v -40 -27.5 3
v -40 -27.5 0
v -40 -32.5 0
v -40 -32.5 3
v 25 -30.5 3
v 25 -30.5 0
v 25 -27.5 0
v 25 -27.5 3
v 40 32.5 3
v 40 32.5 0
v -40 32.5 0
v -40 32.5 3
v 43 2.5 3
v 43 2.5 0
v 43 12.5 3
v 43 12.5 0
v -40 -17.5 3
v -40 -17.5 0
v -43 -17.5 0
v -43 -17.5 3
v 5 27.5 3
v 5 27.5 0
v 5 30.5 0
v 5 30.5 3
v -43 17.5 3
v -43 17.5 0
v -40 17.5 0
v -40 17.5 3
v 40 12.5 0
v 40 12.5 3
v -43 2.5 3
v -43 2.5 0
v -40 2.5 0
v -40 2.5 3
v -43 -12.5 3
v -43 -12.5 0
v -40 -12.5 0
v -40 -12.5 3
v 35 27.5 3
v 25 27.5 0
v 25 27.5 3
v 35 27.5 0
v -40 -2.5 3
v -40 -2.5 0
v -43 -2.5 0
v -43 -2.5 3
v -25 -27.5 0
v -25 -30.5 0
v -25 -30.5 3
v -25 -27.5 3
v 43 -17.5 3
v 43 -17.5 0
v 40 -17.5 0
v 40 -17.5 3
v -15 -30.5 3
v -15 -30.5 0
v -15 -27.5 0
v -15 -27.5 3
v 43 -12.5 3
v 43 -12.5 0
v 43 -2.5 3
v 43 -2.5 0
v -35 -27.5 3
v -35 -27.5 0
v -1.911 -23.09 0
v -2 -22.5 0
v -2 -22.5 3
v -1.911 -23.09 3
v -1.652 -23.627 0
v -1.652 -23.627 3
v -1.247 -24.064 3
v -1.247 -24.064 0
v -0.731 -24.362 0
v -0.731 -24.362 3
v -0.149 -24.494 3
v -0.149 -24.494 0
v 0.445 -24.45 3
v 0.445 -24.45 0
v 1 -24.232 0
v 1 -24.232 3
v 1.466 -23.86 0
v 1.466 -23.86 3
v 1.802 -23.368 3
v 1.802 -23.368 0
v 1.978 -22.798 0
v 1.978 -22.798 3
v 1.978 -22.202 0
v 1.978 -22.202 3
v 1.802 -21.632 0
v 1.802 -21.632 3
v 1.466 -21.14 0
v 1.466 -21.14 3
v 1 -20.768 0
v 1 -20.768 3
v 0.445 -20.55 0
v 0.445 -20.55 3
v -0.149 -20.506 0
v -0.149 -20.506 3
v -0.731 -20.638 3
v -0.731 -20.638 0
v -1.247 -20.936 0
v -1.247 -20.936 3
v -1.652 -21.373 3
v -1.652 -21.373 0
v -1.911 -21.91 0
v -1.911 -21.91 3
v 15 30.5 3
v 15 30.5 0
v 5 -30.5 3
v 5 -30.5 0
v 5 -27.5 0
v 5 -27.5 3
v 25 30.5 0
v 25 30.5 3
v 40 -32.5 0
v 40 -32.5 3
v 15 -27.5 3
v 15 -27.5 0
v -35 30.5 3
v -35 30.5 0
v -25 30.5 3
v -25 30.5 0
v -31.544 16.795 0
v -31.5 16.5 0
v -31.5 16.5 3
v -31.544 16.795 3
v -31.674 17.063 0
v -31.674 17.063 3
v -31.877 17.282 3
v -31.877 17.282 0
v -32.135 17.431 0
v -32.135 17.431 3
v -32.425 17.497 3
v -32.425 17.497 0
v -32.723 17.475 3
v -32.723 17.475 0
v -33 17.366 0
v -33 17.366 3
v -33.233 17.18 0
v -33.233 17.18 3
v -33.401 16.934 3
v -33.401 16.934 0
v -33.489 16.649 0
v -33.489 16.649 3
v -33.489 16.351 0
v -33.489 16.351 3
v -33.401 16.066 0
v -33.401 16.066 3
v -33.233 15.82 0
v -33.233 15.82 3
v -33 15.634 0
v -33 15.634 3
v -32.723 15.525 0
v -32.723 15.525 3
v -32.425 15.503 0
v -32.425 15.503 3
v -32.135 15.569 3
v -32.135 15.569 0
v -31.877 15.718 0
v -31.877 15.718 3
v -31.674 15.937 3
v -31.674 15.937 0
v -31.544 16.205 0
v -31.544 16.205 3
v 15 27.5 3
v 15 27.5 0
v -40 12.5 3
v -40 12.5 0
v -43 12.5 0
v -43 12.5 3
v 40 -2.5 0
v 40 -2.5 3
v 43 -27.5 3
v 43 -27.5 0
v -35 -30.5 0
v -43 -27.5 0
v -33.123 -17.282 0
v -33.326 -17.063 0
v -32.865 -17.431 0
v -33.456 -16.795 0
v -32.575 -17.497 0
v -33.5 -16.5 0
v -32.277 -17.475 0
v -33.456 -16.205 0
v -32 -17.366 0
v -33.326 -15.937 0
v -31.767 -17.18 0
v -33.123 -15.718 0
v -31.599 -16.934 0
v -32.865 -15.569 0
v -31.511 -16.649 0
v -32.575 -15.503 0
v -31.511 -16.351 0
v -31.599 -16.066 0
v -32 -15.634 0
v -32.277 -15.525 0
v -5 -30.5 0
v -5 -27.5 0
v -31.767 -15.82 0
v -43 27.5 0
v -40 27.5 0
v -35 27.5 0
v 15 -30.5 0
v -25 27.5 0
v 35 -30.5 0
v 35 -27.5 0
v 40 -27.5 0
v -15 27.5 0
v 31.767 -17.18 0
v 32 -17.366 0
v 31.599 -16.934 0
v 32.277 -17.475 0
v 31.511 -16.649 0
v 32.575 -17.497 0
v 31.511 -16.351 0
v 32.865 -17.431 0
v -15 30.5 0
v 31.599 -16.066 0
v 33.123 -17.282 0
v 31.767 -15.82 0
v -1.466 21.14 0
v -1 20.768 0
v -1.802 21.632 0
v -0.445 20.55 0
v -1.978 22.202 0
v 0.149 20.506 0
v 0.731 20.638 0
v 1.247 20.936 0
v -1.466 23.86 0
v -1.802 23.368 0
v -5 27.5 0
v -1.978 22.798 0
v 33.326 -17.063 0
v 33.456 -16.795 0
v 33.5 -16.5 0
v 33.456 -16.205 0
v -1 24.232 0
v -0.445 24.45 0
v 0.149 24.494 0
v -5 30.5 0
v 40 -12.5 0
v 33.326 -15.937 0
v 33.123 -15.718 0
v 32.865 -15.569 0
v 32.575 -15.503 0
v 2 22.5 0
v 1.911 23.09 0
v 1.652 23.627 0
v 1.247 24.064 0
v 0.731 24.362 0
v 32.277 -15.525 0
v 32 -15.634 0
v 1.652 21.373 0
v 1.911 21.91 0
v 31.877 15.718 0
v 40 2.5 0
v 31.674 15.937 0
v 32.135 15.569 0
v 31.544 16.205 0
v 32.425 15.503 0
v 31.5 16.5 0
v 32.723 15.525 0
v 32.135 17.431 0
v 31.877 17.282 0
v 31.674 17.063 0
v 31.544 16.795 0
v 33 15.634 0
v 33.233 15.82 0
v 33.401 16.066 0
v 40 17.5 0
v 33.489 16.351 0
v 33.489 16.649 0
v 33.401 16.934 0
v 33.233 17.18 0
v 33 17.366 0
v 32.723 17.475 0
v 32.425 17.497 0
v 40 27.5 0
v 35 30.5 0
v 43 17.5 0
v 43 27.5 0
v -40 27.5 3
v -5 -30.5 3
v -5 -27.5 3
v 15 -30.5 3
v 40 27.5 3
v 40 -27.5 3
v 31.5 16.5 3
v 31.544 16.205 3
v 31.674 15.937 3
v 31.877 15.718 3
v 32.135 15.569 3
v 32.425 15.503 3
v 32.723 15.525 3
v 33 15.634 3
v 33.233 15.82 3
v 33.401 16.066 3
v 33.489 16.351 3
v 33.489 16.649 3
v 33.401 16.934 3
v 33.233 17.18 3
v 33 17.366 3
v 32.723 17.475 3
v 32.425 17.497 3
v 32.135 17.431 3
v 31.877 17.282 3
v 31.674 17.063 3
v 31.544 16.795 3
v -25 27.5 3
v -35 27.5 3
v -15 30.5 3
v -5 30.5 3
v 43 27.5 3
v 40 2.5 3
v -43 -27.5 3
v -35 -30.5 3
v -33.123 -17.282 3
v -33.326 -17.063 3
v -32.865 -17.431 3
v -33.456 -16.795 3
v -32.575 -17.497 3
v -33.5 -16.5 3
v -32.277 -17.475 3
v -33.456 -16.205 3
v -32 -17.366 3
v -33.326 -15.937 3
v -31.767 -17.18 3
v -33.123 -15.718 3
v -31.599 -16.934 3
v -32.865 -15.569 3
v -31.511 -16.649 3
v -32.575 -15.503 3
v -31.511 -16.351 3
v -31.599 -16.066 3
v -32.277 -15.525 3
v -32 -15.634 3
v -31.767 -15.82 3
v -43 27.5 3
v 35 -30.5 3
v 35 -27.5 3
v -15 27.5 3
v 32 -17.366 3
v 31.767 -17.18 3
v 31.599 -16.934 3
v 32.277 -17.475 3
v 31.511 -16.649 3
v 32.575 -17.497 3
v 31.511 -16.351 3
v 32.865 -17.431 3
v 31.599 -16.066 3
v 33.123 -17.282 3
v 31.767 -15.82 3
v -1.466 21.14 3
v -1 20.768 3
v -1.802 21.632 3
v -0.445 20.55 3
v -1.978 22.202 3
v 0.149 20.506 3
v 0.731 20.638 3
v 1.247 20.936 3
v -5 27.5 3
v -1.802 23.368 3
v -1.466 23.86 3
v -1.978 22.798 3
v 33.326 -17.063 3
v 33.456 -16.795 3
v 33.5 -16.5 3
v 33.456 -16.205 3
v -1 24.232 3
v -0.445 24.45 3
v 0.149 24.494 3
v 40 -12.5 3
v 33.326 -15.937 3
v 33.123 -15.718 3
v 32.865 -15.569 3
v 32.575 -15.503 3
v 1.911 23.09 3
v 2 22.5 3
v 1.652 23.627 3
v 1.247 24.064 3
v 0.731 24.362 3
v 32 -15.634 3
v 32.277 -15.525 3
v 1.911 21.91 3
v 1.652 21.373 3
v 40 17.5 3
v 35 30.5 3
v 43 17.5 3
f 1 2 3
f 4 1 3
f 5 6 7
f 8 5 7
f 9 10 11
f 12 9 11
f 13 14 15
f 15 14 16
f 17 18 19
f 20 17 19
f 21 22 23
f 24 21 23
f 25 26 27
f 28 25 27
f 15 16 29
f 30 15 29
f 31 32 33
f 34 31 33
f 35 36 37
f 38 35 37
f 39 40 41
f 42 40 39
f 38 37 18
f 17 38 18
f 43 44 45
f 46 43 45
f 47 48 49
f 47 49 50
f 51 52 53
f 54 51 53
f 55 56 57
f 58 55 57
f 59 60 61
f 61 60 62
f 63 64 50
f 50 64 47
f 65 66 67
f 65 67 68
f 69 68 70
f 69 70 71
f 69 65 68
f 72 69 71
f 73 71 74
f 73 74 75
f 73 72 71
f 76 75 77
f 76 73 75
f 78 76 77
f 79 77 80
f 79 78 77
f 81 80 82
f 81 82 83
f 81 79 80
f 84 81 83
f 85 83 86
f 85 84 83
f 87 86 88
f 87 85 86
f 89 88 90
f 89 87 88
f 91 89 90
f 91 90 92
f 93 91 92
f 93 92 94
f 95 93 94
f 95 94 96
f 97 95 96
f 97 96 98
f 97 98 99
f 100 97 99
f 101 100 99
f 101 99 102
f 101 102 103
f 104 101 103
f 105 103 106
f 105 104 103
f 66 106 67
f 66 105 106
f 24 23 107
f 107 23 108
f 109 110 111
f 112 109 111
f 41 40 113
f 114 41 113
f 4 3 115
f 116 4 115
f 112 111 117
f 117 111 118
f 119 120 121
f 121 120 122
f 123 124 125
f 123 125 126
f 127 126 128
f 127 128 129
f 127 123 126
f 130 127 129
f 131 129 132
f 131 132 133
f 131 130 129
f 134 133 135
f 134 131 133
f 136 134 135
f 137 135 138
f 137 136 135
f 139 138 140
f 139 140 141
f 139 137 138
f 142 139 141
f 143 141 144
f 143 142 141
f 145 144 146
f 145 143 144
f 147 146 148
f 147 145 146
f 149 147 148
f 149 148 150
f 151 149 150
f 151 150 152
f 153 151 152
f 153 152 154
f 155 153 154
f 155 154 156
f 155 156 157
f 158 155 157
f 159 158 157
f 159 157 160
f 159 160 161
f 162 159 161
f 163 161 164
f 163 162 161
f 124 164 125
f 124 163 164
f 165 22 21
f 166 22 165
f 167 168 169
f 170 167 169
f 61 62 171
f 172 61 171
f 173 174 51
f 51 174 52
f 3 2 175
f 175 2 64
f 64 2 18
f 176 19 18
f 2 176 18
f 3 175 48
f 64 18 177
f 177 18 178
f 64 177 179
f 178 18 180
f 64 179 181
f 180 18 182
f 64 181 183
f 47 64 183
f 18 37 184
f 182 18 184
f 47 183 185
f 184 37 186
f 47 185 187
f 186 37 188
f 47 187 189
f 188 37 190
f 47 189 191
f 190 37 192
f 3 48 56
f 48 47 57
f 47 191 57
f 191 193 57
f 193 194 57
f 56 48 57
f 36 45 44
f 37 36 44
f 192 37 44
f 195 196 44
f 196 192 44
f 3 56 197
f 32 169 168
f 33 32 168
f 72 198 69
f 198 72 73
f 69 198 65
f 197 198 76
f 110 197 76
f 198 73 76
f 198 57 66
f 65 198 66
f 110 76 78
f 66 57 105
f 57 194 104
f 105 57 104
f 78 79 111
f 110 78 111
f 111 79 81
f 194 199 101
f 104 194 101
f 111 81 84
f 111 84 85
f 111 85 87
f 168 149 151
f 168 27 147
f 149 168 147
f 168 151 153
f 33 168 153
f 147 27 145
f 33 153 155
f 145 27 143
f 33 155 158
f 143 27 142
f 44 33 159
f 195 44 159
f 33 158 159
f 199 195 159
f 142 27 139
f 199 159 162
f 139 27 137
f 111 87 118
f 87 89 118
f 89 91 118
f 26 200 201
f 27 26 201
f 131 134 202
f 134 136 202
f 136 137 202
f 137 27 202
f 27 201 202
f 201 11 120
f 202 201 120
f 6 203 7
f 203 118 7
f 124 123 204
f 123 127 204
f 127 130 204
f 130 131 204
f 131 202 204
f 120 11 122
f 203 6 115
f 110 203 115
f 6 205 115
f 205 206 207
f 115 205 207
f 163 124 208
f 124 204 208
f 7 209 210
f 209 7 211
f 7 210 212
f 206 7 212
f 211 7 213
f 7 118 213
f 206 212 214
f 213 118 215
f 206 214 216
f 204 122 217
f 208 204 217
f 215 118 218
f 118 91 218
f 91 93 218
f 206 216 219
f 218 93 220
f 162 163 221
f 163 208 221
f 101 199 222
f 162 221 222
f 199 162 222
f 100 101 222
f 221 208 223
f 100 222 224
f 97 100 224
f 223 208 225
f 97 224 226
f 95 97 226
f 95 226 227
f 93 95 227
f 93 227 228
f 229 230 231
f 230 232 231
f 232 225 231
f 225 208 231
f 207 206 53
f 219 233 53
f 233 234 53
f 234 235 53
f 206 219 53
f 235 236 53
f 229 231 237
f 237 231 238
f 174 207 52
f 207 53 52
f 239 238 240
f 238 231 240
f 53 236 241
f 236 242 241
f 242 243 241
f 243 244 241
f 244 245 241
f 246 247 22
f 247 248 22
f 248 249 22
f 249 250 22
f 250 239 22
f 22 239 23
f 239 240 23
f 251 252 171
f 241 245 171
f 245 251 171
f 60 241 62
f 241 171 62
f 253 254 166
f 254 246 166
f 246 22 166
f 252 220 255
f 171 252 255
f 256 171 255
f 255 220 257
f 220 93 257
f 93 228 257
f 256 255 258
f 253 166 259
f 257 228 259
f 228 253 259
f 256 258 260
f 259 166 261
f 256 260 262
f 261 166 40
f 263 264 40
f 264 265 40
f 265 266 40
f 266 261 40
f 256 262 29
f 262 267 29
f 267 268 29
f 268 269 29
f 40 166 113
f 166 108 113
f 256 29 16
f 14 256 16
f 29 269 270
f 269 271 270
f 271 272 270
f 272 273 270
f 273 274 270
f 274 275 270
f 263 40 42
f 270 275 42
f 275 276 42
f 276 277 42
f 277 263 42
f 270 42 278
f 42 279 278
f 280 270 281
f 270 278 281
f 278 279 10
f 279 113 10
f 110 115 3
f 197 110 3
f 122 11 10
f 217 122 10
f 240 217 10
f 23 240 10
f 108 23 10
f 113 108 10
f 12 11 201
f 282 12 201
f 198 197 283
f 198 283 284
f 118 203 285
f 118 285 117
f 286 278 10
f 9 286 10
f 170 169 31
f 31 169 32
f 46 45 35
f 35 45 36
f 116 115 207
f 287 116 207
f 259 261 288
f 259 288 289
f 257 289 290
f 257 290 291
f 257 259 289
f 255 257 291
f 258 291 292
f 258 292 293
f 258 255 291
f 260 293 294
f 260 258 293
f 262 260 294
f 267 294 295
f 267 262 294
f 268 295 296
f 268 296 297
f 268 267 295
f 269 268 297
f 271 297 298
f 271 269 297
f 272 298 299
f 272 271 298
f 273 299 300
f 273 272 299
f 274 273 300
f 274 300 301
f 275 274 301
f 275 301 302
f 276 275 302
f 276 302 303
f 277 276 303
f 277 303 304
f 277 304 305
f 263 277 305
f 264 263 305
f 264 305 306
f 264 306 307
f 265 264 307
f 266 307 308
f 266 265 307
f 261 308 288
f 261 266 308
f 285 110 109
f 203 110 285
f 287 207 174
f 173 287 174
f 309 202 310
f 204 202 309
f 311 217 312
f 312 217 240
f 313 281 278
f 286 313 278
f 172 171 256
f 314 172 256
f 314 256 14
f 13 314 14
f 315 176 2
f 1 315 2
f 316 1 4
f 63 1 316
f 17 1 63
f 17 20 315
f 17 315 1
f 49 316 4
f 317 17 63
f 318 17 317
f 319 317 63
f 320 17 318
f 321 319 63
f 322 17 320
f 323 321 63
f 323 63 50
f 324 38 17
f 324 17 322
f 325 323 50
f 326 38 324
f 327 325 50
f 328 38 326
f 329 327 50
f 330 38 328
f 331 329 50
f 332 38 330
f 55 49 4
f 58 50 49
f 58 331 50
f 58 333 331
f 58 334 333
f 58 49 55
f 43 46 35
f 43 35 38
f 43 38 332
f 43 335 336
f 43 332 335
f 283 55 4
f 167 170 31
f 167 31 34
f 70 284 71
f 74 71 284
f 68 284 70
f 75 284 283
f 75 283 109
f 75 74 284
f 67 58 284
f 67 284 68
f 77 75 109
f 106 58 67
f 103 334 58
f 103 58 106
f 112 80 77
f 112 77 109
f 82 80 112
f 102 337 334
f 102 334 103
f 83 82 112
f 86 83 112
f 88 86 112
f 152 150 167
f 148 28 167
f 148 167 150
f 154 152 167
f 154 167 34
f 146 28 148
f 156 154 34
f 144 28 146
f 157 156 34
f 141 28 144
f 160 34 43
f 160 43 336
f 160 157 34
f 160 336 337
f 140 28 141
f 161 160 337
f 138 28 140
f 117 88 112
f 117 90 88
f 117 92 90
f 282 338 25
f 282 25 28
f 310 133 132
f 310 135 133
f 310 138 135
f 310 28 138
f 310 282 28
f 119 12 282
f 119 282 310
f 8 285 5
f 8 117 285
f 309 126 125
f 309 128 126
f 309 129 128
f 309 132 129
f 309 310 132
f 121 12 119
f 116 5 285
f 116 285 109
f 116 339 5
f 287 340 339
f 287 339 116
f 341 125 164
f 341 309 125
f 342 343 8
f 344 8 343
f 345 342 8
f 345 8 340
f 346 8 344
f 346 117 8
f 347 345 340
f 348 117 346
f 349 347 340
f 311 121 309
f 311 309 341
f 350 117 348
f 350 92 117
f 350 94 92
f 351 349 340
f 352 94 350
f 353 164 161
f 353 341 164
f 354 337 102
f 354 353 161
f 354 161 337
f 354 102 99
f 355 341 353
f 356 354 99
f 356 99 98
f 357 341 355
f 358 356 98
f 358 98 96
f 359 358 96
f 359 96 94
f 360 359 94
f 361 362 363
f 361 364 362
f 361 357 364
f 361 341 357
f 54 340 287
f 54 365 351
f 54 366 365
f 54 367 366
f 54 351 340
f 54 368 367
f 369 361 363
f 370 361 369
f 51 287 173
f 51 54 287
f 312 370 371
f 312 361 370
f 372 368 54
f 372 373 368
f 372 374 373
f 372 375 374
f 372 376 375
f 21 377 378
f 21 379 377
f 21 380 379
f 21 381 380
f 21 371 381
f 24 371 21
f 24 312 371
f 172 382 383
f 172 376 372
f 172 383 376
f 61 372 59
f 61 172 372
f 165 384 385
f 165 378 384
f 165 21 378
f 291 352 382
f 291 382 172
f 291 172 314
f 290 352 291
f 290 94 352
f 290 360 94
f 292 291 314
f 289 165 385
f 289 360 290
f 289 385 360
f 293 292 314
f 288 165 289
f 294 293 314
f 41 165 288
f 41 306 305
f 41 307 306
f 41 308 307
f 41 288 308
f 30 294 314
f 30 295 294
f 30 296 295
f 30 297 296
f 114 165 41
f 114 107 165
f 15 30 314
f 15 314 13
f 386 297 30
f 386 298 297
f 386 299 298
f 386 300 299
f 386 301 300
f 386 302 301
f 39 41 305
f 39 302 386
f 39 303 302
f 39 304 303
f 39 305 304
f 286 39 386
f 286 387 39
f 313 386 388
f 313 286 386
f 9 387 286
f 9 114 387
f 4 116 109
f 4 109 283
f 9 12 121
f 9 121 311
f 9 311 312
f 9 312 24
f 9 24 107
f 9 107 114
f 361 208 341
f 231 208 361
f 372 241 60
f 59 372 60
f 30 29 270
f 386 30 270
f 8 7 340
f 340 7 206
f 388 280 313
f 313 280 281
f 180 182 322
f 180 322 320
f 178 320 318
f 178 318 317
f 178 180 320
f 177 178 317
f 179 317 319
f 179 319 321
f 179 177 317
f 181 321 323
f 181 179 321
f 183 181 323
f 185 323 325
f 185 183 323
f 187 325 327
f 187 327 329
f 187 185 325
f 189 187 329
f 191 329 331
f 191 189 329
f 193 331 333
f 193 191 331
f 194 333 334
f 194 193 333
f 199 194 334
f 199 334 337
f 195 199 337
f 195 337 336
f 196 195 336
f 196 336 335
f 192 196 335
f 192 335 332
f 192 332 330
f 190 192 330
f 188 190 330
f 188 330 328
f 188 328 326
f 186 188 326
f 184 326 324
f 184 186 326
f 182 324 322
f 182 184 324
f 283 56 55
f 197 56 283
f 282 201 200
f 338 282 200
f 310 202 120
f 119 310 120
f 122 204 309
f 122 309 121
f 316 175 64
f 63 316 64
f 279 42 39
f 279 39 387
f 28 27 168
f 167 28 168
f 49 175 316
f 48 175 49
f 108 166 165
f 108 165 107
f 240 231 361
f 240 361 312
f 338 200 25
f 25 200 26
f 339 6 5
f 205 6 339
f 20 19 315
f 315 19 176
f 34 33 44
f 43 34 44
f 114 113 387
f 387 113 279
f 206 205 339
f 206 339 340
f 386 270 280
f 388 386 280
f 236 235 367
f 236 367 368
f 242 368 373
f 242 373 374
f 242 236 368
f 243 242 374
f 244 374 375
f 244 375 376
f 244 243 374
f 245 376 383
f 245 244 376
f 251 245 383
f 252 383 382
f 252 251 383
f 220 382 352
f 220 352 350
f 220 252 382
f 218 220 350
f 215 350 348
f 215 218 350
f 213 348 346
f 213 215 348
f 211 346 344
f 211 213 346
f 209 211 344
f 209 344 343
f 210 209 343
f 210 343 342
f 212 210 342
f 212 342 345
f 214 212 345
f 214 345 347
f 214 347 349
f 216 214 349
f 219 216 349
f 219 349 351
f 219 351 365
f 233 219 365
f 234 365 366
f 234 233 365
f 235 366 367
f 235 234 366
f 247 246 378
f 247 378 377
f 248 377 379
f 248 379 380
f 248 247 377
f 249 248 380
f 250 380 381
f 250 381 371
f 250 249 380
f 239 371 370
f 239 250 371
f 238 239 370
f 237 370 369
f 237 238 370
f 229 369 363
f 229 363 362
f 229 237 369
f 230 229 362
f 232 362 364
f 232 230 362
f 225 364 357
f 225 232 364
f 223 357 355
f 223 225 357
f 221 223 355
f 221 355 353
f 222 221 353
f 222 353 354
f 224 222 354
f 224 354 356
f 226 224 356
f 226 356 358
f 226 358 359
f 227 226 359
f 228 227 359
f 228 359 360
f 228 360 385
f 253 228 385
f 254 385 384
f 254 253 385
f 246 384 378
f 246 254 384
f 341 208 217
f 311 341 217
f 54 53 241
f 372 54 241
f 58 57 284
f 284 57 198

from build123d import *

# Parameters (mm, degrees)
SKETCH_1_R      = 1
SKETCH_1_R_2    = 2
SKETCH_1_W      = 10
SKETCH_1_H      = 3
EXTRUDE_1_DEPTH = 3


with BuildPart() as part:
    # 草图1 → 凸台-拉伸1 (new body)
    with BuildSketch(Plane.XY):
        Polygon((-40, 17.5), (-40, 12.5), (-43, 12.5), (-43, 2.5), (-40, 2.5), (-40, -2.5), (-43, -2.5), (-43, -12.5), (-40, -12.5), (-40, -17.5), (-43, -17.5), (-43, -27.5), (-40, -27.5), (-40, -32.5), (40, -32.5), (40, -27.5), (43, -27.5), (43, -17.5), (40, -17.5), (40, -12.5), (43, -12.5), (43, -2.5), (40, -2.5), (40, 2.5), (43, 2.5), (43, 12.5), (40, 12.5), (40, 17.5), (43, 17.5), (43, 27.5), (40, 27.5), (40, 32.5), (-40, 32.5), (-40, 27.5), (-43, 27.5), (-43, 17.5), align=None)
        with Locations((-32.5, 16.5)):
            Circle(SKETCH_1_R, mode=Mode.SUBTRACT)
        with Locations(Location((32.5, 16.5, 0), (0, 0, 180))):
            Circle(SKETCH_1_R, mode=Mode.SUBTRACT)
        with Locations(Location((-32.5, -16.5, 0), (0, 0, 180))):
            Circle(SKETCH_1_R, mode=Mode.SUBTRACT)
        with Locations((32.5, -16.5)):
            Circle(SKETCH_1_R, mode=Mode.SUBTRACT)
        with Locations((0, 22.5)):
            Circle(SKETCH_1_R_2, mode=Mode.SUBTRACT)
        with Locations(Location((0, -22.5, 0), (0, 0, 180))):
            Circle(SKETCH_1_R_2, mode=Mode.SUBTRACT)
        with Locations((-10, 29)):
            Rectangle(SKETCH_1_W, SKETCH_1_H, mode=Mode.SUBTRACT)
        with Locations((-30, 29)):
            Rectangle(SKETCH_1_W, SKETCH_1_H, mode=Mode.SUBTRACT)
        with Locations((10, 29)):
            Rectangle(SKETCH_1_W, SKETCH_1_H, mode=Mode.SUBTRACT)
        with Locations((30, 29)):
            Rectangle(SKETCH_1_W, SKETCH_1_H, mode=Mode.SUBTRACT)
        with Locations((30, -29)):
            Rectangle(SKETCH_1_W, SKETCH_1_H, mode=Mode.SUBTRACT)
        with Locations((10, -29)):
            Rectangle(SKETCH_1_W, SKETCH_1_H, mode=Mode.SUBTRACT)
        with Locations((-10, -29)):
            Rectangle(SKETCH_1_W, SKETCH_1_H, mode=Mode.SUBTRACT)
        with Locations((-30, -29)):
            Rectangle(SKETCH_1_W, SKETCH_1_H, mode=Mode.SUBTRACT)
    extrude(amount=EXTRUDE_1_DEPTH)


solid = part.part
